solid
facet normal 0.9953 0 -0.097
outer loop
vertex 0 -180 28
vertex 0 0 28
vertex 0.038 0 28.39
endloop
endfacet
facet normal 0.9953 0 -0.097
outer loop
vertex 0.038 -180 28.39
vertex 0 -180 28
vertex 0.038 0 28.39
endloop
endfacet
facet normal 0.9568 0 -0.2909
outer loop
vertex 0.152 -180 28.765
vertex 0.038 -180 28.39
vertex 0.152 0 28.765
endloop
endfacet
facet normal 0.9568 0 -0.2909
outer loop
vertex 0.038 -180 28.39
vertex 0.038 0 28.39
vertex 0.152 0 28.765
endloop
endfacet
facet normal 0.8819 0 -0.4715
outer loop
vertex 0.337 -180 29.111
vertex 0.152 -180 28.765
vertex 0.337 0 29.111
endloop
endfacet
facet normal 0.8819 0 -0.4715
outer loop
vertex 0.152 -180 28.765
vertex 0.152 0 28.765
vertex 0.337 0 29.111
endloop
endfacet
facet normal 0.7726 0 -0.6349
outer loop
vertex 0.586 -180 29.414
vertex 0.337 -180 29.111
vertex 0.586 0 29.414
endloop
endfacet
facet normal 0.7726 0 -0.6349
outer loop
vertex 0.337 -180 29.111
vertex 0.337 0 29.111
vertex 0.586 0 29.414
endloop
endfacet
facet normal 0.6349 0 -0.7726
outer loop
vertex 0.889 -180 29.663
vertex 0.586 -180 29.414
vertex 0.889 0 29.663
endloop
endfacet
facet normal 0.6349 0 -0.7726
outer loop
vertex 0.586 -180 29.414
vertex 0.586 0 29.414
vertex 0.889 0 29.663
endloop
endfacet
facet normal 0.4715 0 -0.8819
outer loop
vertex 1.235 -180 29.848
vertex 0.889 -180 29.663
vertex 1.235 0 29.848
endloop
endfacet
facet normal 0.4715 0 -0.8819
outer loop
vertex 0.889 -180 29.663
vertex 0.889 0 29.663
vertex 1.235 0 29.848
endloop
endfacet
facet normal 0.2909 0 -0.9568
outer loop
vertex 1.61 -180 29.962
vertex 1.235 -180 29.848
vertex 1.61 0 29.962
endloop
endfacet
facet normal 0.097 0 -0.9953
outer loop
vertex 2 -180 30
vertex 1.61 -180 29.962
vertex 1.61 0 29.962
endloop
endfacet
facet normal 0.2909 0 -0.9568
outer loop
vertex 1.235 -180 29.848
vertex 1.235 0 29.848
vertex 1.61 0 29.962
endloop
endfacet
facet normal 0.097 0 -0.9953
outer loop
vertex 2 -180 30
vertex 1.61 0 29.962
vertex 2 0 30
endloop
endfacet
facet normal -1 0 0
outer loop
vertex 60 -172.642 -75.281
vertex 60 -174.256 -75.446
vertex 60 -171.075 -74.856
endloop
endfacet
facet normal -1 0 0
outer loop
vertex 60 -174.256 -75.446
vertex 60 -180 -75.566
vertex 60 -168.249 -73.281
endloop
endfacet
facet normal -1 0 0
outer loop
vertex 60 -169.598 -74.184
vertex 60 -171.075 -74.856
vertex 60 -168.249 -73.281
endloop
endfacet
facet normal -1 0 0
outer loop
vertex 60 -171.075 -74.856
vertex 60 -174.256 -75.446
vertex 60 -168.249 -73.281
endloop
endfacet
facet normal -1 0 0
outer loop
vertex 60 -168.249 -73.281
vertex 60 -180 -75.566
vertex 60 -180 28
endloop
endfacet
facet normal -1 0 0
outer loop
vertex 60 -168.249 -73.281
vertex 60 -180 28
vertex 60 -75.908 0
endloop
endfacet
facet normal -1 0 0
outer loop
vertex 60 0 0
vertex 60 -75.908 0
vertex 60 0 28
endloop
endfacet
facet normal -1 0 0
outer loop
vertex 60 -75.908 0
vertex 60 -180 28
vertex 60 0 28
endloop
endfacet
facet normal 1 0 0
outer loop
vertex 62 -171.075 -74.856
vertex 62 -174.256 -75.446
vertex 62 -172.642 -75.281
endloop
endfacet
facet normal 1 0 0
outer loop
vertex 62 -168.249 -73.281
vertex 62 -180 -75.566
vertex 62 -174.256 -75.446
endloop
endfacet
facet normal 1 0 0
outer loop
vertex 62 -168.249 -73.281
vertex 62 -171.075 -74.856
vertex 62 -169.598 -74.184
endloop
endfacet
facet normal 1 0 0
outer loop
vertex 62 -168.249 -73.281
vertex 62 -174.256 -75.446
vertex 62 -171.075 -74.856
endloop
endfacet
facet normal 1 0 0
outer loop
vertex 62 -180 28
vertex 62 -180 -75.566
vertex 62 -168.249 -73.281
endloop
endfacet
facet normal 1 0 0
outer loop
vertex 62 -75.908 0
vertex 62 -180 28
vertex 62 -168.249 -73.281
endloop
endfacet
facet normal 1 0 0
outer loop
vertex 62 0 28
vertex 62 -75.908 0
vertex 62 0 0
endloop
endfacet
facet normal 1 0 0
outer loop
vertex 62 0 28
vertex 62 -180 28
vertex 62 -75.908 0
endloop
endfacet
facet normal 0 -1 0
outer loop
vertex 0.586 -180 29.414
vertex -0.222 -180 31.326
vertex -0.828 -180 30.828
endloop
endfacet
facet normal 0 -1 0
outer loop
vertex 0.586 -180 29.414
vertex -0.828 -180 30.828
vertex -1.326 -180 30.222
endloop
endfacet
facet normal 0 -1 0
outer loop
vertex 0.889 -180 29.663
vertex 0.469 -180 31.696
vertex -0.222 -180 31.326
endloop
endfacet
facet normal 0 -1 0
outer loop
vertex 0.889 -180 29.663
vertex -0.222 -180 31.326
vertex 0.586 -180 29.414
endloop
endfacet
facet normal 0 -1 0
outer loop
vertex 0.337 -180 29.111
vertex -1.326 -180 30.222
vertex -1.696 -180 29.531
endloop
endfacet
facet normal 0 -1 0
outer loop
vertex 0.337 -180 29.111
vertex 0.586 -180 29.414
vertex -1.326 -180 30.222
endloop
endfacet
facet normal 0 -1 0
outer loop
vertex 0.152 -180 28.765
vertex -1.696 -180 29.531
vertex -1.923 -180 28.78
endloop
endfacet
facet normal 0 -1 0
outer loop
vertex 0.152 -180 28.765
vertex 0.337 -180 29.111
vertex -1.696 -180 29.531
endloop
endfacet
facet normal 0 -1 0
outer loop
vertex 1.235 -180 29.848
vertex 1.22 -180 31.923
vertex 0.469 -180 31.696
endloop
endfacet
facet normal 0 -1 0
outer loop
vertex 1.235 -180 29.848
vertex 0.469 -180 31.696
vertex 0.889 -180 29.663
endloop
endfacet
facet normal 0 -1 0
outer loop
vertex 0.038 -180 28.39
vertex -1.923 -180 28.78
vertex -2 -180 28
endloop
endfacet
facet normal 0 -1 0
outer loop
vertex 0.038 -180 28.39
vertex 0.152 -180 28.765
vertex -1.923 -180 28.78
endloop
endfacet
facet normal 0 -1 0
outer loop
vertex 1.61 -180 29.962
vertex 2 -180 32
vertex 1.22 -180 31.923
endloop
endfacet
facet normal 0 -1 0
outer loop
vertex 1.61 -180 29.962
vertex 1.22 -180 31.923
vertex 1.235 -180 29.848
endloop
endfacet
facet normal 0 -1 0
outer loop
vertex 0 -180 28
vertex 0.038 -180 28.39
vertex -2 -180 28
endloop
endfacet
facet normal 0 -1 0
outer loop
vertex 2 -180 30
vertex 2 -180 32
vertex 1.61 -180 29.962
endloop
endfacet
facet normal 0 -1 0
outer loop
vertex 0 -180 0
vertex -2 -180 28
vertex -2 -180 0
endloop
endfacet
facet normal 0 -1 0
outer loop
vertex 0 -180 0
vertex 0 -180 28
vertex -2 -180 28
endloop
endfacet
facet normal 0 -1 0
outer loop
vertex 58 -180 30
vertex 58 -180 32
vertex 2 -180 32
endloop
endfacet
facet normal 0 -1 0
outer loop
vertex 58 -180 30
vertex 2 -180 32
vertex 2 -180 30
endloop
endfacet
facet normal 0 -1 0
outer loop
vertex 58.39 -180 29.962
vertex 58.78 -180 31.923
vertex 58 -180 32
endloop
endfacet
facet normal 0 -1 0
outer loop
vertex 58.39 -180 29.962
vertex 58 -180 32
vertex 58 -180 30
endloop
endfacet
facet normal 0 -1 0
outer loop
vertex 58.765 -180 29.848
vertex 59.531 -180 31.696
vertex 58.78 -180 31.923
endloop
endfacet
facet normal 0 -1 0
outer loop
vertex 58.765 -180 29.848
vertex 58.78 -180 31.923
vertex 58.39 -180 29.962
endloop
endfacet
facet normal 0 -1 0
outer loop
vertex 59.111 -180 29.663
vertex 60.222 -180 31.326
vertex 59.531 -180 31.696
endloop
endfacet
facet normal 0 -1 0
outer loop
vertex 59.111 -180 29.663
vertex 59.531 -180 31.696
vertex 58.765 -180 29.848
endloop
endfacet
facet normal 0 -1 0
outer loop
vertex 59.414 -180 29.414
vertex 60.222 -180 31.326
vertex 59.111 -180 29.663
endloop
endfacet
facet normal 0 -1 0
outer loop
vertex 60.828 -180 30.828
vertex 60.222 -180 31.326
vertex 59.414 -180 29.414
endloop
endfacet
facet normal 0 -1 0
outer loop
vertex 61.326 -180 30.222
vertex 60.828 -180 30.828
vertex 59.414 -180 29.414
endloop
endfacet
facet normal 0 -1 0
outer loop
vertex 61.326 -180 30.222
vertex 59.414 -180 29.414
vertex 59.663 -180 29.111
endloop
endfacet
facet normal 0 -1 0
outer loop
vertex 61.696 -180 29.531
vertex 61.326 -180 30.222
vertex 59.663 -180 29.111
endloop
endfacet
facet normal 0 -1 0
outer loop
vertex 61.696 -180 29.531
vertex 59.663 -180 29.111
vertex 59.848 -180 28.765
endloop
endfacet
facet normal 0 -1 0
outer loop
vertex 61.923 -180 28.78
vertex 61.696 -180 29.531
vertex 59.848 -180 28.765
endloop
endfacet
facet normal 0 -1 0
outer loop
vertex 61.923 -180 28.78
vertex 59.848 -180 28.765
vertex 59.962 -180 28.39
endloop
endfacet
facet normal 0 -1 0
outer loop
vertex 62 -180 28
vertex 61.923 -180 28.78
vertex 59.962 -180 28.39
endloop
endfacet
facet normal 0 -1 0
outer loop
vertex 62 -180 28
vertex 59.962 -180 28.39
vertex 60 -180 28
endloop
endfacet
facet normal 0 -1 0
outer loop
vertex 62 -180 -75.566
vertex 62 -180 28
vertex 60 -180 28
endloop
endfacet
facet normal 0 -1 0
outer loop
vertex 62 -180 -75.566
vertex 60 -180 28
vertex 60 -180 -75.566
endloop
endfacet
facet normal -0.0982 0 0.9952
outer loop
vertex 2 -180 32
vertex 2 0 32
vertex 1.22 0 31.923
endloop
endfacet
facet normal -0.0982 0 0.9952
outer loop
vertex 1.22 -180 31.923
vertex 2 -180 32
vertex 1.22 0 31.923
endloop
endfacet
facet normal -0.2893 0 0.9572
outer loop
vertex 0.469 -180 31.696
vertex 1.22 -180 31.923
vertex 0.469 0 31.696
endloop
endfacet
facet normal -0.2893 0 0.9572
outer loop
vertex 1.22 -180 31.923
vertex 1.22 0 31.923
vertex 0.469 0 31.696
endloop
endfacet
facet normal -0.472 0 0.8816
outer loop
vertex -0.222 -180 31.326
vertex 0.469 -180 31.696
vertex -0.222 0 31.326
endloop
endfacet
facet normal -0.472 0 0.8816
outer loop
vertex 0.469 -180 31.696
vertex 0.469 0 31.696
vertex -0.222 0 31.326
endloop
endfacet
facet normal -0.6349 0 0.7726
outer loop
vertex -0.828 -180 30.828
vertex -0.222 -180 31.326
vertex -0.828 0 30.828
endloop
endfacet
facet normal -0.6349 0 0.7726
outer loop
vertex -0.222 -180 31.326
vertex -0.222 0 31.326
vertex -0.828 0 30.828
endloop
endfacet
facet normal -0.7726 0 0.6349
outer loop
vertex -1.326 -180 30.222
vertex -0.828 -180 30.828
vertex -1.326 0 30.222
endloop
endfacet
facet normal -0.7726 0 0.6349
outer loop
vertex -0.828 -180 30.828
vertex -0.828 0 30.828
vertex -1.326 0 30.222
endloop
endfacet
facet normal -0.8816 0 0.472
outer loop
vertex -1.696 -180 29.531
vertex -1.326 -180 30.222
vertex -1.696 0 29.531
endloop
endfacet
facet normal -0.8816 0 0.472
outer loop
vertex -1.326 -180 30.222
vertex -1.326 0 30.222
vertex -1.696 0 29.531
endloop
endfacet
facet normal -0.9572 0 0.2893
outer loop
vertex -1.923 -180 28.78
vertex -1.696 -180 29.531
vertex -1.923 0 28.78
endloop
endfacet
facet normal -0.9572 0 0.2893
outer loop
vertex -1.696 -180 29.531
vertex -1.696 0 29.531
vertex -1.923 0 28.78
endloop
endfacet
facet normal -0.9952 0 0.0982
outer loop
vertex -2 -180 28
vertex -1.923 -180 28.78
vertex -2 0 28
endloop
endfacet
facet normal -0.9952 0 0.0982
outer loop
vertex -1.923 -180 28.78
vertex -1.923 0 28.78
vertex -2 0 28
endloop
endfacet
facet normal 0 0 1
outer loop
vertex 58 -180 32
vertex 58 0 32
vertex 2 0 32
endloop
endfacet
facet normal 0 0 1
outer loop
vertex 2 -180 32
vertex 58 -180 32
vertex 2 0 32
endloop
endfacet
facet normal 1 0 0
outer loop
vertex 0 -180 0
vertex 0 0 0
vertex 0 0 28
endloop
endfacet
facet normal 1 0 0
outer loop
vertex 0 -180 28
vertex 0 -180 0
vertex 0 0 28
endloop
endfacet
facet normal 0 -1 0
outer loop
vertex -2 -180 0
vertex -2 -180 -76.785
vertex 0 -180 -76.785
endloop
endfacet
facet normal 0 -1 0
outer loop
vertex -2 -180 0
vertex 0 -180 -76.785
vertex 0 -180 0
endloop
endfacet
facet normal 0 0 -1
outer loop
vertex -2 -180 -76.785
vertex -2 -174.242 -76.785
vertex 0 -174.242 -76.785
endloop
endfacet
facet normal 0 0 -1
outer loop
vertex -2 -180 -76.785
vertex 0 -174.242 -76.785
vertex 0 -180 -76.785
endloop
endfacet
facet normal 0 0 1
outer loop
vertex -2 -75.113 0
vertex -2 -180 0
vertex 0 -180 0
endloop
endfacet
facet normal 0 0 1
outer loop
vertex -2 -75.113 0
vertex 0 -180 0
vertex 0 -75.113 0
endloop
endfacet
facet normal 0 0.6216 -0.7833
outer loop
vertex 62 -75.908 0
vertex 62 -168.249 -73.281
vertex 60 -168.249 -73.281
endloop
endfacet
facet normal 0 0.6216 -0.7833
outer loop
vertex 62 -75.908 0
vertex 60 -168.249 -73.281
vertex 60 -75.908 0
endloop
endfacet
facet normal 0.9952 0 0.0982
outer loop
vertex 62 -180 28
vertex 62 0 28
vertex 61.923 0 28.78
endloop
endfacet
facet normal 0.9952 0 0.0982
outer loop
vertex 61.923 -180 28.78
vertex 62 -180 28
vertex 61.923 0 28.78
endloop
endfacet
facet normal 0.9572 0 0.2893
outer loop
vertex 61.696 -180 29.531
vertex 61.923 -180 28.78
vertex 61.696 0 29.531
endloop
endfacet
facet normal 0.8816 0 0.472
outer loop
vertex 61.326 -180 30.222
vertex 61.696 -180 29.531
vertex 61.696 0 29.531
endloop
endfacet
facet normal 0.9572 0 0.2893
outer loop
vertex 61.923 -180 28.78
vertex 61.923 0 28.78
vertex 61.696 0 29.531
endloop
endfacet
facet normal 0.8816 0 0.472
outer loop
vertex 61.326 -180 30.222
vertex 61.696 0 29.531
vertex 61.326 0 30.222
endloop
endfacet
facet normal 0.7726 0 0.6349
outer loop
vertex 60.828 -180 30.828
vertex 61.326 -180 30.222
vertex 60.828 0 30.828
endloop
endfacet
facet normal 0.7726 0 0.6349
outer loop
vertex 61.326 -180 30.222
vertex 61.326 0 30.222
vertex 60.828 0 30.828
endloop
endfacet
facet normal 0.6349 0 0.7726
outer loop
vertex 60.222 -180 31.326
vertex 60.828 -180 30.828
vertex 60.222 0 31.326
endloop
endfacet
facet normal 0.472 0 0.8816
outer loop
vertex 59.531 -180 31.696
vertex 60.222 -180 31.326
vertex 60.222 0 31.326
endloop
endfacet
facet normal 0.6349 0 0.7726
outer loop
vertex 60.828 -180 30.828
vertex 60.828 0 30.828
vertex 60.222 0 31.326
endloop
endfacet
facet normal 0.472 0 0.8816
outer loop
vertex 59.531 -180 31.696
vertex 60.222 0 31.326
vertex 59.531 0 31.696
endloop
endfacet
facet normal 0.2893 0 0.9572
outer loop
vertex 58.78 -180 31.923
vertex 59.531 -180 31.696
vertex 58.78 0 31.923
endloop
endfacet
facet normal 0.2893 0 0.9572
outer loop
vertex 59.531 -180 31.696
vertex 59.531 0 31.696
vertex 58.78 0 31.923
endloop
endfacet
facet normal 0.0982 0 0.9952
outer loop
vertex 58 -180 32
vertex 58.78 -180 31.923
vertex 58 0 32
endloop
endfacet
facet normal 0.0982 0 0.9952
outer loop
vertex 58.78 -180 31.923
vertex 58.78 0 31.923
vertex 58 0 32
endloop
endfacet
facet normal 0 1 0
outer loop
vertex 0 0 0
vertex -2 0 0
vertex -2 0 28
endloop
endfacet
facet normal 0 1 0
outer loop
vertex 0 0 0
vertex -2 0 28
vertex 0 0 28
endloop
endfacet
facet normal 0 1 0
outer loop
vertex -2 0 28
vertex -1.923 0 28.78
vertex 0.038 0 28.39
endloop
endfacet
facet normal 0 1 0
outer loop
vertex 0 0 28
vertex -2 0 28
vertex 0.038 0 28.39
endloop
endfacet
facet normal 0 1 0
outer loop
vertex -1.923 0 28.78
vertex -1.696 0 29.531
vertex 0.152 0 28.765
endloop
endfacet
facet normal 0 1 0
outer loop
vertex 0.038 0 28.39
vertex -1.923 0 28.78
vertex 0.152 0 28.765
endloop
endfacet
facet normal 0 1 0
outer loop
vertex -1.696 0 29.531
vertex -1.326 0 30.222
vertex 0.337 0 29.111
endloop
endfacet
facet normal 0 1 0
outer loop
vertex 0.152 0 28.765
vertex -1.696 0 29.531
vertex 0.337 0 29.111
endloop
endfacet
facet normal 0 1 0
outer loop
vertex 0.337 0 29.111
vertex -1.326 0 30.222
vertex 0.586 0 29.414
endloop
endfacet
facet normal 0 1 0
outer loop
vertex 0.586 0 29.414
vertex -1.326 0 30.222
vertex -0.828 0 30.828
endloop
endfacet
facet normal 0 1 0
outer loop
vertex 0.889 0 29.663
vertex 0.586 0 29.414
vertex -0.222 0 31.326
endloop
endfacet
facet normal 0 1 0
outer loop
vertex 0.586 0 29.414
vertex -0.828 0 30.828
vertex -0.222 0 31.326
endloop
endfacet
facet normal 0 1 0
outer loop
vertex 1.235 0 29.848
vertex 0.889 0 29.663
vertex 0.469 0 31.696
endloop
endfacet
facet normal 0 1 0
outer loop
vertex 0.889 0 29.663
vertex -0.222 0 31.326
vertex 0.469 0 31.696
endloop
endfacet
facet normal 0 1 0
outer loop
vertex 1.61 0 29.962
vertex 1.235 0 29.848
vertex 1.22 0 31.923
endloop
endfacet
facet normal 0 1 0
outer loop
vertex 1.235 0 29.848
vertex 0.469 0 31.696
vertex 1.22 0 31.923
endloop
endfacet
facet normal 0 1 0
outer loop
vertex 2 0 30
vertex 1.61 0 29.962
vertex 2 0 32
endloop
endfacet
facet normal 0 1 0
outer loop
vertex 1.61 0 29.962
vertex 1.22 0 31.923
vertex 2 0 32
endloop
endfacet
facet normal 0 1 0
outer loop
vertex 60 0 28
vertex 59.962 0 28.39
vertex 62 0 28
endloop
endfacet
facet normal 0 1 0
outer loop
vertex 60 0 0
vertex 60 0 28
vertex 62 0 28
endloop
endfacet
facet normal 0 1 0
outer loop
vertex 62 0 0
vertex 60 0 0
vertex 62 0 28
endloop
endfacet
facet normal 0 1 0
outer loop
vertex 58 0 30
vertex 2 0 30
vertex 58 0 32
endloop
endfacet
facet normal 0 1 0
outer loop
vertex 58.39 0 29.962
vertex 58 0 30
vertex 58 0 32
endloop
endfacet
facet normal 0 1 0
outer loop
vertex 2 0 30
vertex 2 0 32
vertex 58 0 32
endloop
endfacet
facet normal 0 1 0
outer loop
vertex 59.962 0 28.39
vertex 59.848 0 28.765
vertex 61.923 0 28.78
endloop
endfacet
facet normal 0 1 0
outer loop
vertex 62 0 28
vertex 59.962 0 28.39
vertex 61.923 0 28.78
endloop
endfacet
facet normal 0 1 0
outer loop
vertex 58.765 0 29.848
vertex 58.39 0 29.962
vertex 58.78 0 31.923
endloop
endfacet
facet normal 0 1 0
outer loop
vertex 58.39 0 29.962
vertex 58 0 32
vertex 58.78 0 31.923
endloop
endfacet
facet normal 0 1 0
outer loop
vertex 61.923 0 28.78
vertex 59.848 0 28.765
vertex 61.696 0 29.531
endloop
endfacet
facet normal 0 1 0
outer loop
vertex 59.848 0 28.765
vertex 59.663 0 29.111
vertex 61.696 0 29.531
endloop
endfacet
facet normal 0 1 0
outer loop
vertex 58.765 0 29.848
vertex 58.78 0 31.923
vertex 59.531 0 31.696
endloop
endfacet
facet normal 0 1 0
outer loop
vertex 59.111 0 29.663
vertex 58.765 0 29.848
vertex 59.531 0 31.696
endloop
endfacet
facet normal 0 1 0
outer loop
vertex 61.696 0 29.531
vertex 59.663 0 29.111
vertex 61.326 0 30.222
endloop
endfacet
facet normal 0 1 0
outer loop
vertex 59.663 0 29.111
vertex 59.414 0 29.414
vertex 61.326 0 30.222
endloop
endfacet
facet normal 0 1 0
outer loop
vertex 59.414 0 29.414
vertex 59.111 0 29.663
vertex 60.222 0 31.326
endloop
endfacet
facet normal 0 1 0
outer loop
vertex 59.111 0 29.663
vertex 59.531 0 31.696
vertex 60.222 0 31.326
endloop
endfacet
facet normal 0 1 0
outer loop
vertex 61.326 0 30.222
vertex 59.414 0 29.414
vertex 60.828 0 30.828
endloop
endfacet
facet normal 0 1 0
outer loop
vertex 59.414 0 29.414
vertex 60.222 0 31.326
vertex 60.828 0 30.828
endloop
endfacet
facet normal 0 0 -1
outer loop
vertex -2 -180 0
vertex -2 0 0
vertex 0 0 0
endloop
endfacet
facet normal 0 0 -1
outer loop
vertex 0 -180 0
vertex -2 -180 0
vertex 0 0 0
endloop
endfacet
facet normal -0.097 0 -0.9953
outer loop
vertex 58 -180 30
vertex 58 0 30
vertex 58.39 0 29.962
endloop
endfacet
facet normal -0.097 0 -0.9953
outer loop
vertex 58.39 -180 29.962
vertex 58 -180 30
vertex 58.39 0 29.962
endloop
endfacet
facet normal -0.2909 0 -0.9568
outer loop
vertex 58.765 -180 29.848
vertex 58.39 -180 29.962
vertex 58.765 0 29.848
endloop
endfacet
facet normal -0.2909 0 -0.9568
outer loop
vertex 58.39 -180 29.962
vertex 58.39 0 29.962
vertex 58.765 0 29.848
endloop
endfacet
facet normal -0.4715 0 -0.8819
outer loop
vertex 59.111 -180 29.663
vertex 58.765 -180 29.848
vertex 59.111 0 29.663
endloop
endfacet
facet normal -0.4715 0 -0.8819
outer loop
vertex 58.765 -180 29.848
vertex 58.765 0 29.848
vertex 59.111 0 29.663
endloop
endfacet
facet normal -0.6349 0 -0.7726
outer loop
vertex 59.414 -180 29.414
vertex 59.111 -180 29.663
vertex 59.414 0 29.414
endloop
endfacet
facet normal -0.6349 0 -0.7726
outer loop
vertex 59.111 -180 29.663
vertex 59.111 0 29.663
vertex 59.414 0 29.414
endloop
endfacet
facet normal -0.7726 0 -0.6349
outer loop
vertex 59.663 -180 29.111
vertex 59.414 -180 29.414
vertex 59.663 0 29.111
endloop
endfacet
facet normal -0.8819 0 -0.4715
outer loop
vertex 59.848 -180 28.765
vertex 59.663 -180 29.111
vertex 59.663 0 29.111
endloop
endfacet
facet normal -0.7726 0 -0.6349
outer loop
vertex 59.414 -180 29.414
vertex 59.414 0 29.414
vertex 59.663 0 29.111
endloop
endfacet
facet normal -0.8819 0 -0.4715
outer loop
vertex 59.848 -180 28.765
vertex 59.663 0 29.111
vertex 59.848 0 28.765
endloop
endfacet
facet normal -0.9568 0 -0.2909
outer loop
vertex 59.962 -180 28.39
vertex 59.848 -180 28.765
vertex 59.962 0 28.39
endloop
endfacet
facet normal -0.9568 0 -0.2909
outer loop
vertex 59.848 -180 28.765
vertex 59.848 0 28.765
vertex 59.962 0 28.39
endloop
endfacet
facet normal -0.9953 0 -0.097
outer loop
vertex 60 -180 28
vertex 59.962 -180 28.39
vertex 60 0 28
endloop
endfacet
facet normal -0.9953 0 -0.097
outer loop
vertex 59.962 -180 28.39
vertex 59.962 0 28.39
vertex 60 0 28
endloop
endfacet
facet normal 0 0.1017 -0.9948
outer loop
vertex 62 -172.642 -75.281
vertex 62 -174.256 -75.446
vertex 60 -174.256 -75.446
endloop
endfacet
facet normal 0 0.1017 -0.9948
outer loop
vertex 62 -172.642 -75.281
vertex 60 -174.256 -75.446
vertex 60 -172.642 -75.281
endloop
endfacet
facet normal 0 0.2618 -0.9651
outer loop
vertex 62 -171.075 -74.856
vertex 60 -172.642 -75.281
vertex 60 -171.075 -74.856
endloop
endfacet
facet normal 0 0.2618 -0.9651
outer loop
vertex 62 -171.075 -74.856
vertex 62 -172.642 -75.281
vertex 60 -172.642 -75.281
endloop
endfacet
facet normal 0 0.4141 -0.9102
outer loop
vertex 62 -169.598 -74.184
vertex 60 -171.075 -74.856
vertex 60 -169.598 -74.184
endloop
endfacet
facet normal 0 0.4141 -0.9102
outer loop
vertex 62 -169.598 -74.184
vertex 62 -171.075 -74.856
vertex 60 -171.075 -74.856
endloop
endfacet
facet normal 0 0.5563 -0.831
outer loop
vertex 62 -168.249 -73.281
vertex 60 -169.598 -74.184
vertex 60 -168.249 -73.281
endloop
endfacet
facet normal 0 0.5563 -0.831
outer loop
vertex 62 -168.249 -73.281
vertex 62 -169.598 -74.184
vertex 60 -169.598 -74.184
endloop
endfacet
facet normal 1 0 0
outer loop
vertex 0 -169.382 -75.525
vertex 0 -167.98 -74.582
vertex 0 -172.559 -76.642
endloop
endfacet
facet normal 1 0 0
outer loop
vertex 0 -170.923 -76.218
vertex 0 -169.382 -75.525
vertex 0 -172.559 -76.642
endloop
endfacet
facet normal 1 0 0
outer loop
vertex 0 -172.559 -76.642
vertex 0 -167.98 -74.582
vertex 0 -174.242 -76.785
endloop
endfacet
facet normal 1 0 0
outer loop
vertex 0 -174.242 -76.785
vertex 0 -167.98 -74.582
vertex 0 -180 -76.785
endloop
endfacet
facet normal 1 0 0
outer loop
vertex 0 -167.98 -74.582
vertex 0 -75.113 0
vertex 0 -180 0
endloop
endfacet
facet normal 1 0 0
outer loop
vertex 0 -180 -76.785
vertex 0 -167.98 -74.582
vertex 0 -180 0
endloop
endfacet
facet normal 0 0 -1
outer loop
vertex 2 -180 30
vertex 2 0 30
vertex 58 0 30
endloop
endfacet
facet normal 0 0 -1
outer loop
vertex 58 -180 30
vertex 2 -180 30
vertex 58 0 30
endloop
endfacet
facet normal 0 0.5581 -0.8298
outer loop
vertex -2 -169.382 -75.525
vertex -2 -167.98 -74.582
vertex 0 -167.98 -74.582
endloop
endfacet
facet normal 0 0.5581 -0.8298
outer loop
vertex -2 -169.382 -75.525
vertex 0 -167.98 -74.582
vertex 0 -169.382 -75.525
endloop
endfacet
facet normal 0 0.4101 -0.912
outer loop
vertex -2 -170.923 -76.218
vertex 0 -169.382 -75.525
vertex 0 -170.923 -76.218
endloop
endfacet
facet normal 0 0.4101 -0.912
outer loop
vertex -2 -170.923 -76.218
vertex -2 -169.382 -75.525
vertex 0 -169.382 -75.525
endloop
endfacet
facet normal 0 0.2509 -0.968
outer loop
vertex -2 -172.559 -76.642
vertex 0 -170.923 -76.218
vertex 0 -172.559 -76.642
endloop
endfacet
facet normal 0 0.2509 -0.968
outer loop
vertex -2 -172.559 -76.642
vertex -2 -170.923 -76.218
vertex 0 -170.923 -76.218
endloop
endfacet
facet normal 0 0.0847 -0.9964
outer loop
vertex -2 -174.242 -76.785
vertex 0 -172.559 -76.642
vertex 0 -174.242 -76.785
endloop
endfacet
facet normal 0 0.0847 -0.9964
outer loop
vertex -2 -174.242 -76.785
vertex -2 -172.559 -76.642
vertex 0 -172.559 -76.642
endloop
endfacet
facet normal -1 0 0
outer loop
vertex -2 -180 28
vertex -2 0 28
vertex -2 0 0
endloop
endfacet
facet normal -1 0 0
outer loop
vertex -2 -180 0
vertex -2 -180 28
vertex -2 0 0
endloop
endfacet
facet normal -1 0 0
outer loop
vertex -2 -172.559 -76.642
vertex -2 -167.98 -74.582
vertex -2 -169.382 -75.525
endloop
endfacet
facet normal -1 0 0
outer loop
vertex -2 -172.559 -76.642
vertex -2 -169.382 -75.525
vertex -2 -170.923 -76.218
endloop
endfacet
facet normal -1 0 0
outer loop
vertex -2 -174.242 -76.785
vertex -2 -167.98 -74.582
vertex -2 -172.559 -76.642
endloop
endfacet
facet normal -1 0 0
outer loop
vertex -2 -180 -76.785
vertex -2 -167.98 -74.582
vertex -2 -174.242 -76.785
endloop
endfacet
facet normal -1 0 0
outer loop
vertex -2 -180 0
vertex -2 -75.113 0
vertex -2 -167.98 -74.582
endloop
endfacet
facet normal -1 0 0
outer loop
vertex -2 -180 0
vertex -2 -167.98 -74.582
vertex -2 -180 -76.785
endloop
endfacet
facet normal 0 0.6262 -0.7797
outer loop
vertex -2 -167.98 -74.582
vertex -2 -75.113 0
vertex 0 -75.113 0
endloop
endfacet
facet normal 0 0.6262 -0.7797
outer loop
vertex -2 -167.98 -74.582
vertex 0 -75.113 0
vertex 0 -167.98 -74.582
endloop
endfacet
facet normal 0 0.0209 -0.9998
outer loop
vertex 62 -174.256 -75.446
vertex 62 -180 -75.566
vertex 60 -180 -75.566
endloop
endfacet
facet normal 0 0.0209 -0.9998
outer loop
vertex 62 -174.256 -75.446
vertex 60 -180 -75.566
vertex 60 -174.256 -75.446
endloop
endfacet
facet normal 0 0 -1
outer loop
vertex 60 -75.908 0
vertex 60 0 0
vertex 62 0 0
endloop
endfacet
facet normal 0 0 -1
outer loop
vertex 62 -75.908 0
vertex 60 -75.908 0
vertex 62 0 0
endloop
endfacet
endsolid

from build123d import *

# Parameters (mm, degrees)
F1_DEPTH = 180
F3_DEPTH = 2
F5_DEPTH = 2


with BuildPart() as f1:
    # F0 (on Front) → F1 (new body)
    with BuildSketch(Plane.XZ):
        with BuildLine():
            Line((-2, 0), (0, 0))
            Line((0, 0), (0, 28))
            ThreePointArc((0, 28), (0.585786, 29.414214), (2, 30))
            Line((2, 30), (58, 30))
            ThreePointArc((58, 30), (59.414214, 29.414214), (60, 28))
            Line((60, 28), (60, 0))
            Line((60, 0), (62, 0))
            Line((62, 0), (62, 28))
            ThreePointArc((62, 28), (60.828427, 30.828427), (58, 32))
            Line((58, 32), (2, 32))
            ThreePointArc((2, 32), (-0.828427, 30.828427), (-2, 28))
            Line((-2, 28), (-2, 0))
        make_face()
    extrude(amount=F1_DEPTH)

    # F2 (on face) → F3 (join)
    with BuildSketch(Plane.YZ.offset(62)):
        with BuildLine():
            Line((-75.907721, 0), (-180, 0))
            Line((-180, 0), (-180, -75.565889))
            Line((-180, -75.565889), (-174.256336, -75.446111))
            ThreePointArc((-174.256336, -75.446111), (-171.074982, -74.856203), (-168.24851, -73.281379))
            Line((-168.24851, -73.281379), (-75.907721, 0))
        make_face()
    extrude(amount=-F3_DEPTH)


with BuildPart() as f5:
    # F4 (on face) → F5 (new body)
    with BuildSketch(Plane(origin=(-2, 0, 0), x_dir=(0, -1, 0), z_dir=(-1, 0, 0))):
        with BuildLine():
            Line((180, -76.785117), (180, 0))
            Line((180, 0), (75.113013, 0))
            Line((75.113013, 0), (167.980425, -74.581994))
            ThreePointArc((167.980425, -74.581994), (170.923133, -76.218271), (174.242111, -76.785117))
            Line((174.242111, -76.785117), (180, -76.785117))
        make_face()
    extrude(amount=-F5_DEPTH)


solid = Compound([f1.part, f5.part])
